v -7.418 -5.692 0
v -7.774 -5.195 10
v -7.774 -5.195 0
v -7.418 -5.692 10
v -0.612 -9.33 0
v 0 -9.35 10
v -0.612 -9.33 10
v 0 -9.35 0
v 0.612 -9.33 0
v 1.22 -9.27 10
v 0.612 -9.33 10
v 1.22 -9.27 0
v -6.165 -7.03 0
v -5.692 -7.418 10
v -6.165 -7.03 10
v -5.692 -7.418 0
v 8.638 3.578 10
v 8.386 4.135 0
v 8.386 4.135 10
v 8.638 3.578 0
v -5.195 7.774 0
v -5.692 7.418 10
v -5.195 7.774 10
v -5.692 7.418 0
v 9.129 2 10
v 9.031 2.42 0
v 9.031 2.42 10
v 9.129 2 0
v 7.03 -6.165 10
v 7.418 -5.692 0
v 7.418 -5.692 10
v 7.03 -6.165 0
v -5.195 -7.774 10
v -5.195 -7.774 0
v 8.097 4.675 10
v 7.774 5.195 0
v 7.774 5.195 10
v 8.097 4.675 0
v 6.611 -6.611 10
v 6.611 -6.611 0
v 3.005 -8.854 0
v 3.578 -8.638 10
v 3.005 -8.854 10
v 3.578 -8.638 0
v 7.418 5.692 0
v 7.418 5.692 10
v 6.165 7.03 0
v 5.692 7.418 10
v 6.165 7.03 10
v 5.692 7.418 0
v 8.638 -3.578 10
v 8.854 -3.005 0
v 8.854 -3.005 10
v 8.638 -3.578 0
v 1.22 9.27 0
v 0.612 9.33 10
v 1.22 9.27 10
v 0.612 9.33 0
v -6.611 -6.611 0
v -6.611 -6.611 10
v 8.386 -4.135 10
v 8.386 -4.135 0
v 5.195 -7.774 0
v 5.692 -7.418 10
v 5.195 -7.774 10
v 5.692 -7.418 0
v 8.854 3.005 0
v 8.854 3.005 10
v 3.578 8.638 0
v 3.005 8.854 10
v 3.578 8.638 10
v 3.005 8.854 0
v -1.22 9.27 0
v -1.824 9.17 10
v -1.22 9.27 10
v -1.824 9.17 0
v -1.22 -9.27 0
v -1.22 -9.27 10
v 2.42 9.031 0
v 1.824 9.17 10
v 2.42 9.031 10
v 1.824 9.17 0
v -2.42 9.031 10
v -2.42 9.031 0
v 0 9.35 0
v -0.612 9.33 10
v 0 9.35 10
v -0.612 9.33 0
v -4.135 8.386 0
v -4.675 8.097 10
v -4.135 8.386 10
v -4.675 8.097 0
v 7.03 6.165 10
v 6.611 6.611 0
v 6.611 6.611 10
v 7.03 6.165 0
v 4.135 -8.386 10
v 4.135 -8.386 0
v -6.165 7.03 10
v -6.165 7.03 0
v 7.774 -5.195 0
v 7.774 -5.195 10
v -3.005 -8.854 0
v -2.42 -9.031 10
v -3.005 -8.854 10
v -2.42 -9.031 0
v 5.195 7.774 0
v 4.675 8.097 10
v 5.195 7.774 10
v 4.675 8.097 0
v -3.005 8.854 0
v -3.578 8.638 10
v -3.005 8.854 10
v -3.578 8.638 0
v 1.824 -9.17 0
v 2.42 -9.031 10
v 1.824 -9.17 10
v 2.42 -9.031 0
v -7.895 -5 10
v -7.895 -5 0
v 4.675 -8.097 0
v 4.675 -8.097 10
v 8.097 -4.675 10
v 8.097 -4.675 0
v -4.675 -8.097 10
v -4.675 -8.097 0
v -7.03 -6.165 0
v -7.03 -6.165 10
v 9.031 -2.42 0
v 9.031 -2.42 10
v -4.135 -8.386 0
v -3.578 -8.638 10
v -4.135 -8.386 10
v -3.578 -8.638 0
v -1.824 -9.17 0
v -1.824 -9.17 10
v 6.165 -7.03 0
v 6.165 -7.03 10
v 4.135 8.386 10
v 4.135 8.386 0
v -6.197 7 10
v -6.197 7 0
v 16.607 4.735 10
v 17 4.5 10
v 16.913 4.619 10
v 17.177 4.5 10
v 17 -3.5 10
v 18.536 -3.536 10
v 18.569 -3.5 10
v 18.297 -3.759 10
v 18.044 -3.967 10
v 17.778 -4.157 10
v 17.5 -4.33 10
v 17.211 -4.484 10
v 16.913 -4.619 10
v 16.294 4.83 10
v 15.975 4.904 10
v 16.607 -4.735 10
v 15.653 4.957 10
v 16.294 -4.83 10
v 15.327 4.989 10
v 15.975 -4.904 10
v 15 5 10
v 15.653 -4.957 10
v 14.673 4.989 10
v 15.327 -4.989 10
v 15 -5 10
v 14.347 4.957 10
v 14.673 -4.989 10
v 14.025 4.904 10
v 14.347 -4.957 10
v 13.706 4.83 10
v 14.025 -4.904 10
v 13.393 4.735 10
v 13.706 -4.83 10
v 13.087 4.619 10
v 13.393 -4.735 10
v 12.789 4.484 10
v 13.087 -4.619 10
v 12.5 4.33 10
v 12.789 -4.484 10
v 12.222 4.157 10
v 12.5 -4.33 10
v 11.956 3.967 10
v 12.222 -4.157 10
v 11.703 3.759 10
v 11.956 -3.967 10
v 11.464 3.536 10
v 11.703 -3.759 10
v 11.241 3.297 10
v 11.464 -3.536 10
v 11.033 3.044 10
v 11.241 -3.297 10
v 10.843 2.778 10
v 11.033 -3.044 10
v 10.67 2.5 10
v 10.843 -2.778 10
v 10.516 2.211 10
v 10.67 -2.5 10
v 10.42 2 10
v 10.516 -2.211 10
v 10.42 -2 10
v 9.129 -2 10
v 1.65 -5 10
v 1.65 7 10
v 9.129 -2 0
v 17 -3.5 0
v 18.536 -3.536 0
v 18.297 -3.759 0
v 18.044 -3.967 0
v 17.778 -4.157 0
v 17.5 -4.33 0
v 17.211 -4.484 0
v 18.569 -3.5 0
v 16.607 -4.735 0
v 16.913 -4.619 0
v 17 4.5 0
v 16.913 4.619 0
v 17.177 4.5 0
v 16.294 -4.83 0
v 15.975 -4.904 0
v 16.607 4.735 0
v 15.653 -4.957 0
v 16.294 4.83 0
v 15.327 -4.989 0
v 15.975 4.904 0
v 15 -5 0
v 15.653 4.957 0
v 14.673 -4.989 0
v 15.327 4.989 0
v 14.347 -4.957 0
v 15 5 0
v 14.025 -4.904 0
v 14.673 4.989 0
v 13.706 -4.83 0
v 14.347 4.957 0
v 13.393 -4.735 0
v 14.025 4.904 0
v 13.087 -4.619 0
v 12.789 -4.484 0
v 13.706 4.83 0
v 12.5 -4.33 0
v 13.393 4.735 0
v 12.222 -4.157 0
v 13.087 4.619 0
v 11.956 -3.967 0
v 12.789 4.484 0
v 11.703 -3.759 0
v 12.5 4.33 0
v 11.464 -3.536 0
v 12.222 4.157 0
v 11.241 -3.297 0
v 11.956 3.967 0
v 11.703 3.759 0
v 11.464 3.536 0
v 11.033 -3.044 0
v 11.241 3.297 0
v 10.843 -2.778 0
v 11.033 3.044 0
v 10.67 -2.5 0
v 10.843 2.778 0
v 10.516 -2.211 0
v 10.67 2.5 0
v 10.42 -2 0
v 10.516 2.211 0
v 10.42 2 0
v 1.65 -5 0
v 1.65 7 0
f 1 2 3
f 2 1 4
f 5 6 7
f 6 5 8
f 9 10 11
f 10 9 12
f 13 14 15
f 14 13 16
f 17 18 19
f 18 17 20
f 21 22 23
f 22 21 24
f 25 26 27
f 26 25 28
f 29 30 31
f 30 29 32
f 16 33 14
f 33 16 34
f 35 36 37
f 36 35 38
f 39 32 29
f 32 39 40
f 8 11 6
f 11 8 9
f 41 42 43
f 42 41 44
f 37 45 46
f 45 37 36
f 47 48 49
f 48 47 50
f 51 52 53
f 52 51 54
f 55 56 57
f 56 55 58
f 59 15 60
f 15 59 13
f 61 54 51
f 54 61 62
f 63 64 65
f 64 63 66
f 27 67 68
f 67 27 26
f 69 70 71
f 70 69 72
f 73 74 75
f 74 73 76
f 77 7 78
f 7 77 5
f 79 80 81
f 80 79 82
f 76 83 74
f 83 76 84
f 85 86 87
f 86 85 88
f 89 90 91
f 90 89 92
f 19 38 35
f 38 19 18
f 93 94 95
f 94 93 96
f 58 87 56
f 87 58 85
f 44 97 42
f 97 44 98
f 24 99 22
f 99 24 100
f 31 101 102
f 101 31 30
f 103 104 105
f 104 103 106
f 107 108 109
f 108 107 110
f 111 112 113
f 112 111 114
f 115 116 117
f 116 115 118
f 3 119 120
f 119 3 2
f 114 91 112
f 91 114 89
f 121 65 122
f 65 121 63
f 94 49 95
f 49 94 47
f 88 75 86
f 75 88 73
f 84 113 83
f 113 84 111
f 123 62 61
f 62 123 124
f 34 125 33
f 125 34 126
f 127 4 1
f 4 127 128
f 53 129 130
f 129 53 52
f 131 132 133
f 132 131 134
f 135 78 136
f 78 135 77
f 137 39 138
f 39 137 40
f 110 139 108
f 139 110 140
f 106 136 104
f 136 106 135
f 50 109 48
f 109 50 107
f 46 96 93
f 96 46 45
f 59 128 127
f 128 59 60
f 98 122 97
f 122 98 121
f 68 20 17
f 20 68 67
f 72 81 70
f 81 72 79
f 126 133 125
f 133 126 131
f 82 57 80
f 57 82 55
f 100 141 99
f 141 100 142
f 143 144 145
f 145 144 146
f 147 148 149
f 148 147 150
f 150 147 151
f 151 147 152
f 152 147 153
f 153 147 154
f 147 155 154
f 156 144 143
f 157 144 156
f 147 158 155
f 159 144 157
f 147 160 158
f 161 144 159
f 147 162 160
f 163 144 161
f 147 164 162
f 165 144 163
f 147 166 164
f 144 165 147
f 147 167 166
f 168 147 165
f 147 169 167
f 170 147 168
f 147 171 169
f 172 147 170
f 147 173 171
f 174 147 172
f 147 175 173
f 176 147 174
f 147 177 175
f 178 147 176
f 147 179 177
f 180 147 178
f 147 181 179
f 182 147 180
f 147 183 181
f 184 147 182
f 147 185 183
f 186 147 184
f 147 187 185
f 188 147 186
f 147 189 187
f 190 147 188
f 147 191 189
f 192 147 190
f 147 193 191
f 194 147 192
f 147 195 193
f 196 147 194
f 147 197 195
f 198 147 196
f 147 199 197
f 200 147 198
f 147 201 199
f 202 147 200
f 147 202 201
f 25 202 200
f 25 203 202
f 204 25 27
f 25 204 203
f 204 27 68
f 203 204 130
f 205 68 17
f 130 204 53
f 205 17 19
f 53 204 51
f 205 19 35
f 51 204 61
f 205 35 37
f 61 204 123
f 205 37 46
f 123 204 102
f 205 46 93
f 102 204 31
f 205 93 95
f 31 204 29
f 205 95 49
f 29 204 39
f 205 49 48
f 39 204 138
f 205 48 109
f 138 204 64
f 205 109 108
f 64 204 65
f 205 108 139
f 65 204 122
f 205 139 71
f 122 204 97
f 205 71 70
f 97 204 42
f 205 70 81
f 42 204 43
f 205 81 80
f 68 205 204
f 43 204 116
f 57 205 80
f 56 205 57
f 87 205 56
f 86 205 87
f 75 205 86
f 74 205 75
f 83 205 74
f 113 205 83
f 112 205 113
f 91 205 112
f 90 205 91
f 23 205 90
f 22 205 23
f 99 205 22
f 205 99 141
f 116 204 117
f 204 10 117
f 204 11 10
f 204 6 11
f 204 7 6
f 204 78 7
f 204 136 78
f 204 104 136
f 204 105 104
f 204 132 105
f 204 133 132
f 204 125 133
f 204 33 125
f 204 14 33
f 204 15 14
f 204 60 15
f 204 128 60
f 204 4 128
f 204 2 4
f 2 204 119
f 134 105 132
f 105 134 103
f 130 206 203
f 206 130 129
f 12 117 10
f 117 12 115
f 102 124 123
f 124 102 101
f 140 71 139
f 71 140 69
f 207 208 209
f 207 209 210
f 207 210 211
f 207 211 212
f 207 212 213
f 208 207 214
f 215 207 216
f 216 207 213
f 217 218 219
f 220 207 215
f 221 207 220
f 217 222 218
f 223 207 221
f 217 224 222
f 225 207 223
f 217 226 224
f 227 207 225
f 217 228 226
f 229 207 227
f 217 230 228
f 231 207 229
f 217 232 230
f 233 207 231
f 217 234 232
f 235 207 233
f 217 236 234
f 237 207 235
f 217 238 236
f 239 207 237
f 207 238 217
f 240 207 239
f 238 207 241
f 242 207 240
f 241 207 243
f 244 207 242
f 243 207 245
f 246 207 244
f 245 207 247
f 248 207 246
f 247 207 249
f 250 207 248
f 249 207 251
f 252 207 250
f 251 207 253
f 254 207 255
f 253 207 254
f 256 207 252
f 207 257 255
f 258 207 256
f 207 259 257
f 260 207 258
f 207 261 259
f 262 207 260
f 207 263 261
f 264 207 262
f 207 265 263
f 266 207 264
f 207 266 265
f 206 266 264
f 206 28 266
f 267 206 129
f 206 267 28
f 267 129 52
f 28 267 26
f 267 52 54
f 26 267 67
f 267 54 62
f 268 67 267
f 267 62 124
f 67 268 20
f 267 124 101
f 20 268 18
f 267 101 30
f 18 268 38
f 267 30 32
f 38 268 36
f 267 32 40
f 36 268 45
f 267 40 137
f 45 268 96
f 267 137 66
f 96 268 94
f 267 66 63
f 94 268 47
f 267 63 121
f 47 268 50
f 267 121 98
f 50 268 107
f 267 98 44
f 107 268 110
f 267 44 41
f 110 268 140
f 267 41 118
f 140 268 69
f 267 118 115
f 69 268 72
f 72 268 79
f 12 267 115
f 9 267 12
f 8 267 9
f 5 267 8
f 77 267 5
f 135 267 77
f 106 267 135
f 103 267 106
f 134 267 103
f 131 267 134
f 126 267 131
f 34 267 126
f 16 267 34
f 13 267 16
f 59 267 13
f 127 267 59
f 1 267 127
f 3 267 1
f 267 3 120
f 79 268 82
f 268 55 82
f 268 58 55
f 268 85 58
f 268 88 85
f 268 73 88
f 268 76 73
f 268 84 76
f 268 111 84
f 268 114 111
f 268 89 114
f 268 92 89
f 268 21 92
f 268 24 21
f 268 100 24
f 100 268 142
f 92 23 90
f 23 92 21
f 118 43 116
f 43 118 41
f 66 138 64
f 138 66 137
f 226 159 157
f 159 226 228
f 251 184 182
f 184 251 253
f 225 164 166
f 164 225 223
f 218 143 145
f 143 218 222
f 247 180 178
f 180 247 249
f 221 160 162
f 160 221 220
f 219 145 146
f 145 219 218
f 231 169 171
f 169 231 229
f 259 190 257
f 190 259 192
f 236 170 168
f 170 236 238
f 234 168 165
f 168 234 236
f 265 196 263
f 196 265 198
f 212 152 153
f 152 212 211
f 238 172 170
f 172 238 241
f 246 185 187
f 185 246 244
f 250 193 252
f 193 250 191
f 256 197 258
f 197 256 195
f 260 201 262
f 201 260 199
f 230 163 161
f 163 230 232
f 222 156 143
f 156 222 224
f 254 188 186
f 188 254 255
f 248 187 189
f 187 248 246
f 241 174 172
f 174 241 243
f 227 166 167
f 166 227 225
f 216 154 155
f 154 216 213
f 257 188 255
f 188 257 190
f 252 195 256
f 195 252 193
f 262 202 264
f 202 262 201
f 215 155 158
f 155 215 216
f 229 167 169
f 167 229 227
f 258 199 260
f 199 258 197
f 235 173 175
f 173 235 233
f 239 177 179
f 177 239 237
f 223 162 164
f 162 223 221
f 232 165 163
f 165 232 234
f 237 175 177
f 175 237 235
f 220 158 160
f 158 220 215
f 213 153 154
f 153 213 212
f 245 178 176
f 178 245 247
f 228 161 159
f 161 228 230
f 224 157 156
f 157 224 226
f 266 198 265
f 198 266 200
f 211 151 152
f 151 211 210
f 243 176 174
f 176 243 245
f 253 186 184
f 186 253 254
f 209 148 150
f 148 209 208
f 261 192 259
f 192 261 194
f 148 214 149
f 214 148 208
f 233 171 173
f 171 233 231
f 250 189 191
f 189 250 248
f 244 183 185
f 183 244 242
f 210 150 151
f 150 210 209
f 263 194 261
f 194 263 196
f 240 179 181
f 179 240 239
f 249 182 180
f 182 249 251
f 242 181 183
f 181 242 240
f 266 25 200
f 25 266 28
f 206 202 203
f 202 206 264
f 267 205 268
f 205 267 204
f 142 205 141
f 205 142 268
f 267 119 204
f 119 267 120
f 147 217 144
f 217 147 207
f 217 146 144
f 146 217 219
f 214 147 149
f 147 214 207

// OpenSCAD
// Stand rod and tubing clip - prints flat, snaps onto a 12.7 mm stand rod and holds a
// small tube next to it. NOVEL general part.
//

rod_d     = 12.7;
ring_w    = 3;
outer_d   = rod_d + 2 * ring_w;
opening_w = 10;
bridge_x1 = 8;
bridge_x2 = 12;
bridge_w  = bridge_x2 - bridge_x1;
tube_d    = 6;
tube_w    = 2;
tube_x    = 15;
cut_x     = tube_x + tube_w;
cut_y     = tube_d / 2 + 0.5;
height    = 10;

$fn = 96;

difference() {
    union() {
        // Stand-rod ring
        cylinder(h = height, d = outer_d);
        // Tubing ring
        translate([tube_x, 0, 0]) cylinder(h = height, d = tube_d + 2 * tube_w);
        // Solid bridge
        translate([bridge_x1, -bridge_w / 2, 0]) cube([bridge_w, bridge_w, height]);
    }
    // Opening in the rod ring
    translate([-outer_d / 2 - 1, -opening_w / 2, 0])
        cube([opening_w + 2, opening_w + 2, height + 2]);
    // Opening in the tubing ring
    translate([cut_x, -cut_y, 0])
        cube([tube_w + 1, 2 * cut_y + 1, height + 2]);
}
